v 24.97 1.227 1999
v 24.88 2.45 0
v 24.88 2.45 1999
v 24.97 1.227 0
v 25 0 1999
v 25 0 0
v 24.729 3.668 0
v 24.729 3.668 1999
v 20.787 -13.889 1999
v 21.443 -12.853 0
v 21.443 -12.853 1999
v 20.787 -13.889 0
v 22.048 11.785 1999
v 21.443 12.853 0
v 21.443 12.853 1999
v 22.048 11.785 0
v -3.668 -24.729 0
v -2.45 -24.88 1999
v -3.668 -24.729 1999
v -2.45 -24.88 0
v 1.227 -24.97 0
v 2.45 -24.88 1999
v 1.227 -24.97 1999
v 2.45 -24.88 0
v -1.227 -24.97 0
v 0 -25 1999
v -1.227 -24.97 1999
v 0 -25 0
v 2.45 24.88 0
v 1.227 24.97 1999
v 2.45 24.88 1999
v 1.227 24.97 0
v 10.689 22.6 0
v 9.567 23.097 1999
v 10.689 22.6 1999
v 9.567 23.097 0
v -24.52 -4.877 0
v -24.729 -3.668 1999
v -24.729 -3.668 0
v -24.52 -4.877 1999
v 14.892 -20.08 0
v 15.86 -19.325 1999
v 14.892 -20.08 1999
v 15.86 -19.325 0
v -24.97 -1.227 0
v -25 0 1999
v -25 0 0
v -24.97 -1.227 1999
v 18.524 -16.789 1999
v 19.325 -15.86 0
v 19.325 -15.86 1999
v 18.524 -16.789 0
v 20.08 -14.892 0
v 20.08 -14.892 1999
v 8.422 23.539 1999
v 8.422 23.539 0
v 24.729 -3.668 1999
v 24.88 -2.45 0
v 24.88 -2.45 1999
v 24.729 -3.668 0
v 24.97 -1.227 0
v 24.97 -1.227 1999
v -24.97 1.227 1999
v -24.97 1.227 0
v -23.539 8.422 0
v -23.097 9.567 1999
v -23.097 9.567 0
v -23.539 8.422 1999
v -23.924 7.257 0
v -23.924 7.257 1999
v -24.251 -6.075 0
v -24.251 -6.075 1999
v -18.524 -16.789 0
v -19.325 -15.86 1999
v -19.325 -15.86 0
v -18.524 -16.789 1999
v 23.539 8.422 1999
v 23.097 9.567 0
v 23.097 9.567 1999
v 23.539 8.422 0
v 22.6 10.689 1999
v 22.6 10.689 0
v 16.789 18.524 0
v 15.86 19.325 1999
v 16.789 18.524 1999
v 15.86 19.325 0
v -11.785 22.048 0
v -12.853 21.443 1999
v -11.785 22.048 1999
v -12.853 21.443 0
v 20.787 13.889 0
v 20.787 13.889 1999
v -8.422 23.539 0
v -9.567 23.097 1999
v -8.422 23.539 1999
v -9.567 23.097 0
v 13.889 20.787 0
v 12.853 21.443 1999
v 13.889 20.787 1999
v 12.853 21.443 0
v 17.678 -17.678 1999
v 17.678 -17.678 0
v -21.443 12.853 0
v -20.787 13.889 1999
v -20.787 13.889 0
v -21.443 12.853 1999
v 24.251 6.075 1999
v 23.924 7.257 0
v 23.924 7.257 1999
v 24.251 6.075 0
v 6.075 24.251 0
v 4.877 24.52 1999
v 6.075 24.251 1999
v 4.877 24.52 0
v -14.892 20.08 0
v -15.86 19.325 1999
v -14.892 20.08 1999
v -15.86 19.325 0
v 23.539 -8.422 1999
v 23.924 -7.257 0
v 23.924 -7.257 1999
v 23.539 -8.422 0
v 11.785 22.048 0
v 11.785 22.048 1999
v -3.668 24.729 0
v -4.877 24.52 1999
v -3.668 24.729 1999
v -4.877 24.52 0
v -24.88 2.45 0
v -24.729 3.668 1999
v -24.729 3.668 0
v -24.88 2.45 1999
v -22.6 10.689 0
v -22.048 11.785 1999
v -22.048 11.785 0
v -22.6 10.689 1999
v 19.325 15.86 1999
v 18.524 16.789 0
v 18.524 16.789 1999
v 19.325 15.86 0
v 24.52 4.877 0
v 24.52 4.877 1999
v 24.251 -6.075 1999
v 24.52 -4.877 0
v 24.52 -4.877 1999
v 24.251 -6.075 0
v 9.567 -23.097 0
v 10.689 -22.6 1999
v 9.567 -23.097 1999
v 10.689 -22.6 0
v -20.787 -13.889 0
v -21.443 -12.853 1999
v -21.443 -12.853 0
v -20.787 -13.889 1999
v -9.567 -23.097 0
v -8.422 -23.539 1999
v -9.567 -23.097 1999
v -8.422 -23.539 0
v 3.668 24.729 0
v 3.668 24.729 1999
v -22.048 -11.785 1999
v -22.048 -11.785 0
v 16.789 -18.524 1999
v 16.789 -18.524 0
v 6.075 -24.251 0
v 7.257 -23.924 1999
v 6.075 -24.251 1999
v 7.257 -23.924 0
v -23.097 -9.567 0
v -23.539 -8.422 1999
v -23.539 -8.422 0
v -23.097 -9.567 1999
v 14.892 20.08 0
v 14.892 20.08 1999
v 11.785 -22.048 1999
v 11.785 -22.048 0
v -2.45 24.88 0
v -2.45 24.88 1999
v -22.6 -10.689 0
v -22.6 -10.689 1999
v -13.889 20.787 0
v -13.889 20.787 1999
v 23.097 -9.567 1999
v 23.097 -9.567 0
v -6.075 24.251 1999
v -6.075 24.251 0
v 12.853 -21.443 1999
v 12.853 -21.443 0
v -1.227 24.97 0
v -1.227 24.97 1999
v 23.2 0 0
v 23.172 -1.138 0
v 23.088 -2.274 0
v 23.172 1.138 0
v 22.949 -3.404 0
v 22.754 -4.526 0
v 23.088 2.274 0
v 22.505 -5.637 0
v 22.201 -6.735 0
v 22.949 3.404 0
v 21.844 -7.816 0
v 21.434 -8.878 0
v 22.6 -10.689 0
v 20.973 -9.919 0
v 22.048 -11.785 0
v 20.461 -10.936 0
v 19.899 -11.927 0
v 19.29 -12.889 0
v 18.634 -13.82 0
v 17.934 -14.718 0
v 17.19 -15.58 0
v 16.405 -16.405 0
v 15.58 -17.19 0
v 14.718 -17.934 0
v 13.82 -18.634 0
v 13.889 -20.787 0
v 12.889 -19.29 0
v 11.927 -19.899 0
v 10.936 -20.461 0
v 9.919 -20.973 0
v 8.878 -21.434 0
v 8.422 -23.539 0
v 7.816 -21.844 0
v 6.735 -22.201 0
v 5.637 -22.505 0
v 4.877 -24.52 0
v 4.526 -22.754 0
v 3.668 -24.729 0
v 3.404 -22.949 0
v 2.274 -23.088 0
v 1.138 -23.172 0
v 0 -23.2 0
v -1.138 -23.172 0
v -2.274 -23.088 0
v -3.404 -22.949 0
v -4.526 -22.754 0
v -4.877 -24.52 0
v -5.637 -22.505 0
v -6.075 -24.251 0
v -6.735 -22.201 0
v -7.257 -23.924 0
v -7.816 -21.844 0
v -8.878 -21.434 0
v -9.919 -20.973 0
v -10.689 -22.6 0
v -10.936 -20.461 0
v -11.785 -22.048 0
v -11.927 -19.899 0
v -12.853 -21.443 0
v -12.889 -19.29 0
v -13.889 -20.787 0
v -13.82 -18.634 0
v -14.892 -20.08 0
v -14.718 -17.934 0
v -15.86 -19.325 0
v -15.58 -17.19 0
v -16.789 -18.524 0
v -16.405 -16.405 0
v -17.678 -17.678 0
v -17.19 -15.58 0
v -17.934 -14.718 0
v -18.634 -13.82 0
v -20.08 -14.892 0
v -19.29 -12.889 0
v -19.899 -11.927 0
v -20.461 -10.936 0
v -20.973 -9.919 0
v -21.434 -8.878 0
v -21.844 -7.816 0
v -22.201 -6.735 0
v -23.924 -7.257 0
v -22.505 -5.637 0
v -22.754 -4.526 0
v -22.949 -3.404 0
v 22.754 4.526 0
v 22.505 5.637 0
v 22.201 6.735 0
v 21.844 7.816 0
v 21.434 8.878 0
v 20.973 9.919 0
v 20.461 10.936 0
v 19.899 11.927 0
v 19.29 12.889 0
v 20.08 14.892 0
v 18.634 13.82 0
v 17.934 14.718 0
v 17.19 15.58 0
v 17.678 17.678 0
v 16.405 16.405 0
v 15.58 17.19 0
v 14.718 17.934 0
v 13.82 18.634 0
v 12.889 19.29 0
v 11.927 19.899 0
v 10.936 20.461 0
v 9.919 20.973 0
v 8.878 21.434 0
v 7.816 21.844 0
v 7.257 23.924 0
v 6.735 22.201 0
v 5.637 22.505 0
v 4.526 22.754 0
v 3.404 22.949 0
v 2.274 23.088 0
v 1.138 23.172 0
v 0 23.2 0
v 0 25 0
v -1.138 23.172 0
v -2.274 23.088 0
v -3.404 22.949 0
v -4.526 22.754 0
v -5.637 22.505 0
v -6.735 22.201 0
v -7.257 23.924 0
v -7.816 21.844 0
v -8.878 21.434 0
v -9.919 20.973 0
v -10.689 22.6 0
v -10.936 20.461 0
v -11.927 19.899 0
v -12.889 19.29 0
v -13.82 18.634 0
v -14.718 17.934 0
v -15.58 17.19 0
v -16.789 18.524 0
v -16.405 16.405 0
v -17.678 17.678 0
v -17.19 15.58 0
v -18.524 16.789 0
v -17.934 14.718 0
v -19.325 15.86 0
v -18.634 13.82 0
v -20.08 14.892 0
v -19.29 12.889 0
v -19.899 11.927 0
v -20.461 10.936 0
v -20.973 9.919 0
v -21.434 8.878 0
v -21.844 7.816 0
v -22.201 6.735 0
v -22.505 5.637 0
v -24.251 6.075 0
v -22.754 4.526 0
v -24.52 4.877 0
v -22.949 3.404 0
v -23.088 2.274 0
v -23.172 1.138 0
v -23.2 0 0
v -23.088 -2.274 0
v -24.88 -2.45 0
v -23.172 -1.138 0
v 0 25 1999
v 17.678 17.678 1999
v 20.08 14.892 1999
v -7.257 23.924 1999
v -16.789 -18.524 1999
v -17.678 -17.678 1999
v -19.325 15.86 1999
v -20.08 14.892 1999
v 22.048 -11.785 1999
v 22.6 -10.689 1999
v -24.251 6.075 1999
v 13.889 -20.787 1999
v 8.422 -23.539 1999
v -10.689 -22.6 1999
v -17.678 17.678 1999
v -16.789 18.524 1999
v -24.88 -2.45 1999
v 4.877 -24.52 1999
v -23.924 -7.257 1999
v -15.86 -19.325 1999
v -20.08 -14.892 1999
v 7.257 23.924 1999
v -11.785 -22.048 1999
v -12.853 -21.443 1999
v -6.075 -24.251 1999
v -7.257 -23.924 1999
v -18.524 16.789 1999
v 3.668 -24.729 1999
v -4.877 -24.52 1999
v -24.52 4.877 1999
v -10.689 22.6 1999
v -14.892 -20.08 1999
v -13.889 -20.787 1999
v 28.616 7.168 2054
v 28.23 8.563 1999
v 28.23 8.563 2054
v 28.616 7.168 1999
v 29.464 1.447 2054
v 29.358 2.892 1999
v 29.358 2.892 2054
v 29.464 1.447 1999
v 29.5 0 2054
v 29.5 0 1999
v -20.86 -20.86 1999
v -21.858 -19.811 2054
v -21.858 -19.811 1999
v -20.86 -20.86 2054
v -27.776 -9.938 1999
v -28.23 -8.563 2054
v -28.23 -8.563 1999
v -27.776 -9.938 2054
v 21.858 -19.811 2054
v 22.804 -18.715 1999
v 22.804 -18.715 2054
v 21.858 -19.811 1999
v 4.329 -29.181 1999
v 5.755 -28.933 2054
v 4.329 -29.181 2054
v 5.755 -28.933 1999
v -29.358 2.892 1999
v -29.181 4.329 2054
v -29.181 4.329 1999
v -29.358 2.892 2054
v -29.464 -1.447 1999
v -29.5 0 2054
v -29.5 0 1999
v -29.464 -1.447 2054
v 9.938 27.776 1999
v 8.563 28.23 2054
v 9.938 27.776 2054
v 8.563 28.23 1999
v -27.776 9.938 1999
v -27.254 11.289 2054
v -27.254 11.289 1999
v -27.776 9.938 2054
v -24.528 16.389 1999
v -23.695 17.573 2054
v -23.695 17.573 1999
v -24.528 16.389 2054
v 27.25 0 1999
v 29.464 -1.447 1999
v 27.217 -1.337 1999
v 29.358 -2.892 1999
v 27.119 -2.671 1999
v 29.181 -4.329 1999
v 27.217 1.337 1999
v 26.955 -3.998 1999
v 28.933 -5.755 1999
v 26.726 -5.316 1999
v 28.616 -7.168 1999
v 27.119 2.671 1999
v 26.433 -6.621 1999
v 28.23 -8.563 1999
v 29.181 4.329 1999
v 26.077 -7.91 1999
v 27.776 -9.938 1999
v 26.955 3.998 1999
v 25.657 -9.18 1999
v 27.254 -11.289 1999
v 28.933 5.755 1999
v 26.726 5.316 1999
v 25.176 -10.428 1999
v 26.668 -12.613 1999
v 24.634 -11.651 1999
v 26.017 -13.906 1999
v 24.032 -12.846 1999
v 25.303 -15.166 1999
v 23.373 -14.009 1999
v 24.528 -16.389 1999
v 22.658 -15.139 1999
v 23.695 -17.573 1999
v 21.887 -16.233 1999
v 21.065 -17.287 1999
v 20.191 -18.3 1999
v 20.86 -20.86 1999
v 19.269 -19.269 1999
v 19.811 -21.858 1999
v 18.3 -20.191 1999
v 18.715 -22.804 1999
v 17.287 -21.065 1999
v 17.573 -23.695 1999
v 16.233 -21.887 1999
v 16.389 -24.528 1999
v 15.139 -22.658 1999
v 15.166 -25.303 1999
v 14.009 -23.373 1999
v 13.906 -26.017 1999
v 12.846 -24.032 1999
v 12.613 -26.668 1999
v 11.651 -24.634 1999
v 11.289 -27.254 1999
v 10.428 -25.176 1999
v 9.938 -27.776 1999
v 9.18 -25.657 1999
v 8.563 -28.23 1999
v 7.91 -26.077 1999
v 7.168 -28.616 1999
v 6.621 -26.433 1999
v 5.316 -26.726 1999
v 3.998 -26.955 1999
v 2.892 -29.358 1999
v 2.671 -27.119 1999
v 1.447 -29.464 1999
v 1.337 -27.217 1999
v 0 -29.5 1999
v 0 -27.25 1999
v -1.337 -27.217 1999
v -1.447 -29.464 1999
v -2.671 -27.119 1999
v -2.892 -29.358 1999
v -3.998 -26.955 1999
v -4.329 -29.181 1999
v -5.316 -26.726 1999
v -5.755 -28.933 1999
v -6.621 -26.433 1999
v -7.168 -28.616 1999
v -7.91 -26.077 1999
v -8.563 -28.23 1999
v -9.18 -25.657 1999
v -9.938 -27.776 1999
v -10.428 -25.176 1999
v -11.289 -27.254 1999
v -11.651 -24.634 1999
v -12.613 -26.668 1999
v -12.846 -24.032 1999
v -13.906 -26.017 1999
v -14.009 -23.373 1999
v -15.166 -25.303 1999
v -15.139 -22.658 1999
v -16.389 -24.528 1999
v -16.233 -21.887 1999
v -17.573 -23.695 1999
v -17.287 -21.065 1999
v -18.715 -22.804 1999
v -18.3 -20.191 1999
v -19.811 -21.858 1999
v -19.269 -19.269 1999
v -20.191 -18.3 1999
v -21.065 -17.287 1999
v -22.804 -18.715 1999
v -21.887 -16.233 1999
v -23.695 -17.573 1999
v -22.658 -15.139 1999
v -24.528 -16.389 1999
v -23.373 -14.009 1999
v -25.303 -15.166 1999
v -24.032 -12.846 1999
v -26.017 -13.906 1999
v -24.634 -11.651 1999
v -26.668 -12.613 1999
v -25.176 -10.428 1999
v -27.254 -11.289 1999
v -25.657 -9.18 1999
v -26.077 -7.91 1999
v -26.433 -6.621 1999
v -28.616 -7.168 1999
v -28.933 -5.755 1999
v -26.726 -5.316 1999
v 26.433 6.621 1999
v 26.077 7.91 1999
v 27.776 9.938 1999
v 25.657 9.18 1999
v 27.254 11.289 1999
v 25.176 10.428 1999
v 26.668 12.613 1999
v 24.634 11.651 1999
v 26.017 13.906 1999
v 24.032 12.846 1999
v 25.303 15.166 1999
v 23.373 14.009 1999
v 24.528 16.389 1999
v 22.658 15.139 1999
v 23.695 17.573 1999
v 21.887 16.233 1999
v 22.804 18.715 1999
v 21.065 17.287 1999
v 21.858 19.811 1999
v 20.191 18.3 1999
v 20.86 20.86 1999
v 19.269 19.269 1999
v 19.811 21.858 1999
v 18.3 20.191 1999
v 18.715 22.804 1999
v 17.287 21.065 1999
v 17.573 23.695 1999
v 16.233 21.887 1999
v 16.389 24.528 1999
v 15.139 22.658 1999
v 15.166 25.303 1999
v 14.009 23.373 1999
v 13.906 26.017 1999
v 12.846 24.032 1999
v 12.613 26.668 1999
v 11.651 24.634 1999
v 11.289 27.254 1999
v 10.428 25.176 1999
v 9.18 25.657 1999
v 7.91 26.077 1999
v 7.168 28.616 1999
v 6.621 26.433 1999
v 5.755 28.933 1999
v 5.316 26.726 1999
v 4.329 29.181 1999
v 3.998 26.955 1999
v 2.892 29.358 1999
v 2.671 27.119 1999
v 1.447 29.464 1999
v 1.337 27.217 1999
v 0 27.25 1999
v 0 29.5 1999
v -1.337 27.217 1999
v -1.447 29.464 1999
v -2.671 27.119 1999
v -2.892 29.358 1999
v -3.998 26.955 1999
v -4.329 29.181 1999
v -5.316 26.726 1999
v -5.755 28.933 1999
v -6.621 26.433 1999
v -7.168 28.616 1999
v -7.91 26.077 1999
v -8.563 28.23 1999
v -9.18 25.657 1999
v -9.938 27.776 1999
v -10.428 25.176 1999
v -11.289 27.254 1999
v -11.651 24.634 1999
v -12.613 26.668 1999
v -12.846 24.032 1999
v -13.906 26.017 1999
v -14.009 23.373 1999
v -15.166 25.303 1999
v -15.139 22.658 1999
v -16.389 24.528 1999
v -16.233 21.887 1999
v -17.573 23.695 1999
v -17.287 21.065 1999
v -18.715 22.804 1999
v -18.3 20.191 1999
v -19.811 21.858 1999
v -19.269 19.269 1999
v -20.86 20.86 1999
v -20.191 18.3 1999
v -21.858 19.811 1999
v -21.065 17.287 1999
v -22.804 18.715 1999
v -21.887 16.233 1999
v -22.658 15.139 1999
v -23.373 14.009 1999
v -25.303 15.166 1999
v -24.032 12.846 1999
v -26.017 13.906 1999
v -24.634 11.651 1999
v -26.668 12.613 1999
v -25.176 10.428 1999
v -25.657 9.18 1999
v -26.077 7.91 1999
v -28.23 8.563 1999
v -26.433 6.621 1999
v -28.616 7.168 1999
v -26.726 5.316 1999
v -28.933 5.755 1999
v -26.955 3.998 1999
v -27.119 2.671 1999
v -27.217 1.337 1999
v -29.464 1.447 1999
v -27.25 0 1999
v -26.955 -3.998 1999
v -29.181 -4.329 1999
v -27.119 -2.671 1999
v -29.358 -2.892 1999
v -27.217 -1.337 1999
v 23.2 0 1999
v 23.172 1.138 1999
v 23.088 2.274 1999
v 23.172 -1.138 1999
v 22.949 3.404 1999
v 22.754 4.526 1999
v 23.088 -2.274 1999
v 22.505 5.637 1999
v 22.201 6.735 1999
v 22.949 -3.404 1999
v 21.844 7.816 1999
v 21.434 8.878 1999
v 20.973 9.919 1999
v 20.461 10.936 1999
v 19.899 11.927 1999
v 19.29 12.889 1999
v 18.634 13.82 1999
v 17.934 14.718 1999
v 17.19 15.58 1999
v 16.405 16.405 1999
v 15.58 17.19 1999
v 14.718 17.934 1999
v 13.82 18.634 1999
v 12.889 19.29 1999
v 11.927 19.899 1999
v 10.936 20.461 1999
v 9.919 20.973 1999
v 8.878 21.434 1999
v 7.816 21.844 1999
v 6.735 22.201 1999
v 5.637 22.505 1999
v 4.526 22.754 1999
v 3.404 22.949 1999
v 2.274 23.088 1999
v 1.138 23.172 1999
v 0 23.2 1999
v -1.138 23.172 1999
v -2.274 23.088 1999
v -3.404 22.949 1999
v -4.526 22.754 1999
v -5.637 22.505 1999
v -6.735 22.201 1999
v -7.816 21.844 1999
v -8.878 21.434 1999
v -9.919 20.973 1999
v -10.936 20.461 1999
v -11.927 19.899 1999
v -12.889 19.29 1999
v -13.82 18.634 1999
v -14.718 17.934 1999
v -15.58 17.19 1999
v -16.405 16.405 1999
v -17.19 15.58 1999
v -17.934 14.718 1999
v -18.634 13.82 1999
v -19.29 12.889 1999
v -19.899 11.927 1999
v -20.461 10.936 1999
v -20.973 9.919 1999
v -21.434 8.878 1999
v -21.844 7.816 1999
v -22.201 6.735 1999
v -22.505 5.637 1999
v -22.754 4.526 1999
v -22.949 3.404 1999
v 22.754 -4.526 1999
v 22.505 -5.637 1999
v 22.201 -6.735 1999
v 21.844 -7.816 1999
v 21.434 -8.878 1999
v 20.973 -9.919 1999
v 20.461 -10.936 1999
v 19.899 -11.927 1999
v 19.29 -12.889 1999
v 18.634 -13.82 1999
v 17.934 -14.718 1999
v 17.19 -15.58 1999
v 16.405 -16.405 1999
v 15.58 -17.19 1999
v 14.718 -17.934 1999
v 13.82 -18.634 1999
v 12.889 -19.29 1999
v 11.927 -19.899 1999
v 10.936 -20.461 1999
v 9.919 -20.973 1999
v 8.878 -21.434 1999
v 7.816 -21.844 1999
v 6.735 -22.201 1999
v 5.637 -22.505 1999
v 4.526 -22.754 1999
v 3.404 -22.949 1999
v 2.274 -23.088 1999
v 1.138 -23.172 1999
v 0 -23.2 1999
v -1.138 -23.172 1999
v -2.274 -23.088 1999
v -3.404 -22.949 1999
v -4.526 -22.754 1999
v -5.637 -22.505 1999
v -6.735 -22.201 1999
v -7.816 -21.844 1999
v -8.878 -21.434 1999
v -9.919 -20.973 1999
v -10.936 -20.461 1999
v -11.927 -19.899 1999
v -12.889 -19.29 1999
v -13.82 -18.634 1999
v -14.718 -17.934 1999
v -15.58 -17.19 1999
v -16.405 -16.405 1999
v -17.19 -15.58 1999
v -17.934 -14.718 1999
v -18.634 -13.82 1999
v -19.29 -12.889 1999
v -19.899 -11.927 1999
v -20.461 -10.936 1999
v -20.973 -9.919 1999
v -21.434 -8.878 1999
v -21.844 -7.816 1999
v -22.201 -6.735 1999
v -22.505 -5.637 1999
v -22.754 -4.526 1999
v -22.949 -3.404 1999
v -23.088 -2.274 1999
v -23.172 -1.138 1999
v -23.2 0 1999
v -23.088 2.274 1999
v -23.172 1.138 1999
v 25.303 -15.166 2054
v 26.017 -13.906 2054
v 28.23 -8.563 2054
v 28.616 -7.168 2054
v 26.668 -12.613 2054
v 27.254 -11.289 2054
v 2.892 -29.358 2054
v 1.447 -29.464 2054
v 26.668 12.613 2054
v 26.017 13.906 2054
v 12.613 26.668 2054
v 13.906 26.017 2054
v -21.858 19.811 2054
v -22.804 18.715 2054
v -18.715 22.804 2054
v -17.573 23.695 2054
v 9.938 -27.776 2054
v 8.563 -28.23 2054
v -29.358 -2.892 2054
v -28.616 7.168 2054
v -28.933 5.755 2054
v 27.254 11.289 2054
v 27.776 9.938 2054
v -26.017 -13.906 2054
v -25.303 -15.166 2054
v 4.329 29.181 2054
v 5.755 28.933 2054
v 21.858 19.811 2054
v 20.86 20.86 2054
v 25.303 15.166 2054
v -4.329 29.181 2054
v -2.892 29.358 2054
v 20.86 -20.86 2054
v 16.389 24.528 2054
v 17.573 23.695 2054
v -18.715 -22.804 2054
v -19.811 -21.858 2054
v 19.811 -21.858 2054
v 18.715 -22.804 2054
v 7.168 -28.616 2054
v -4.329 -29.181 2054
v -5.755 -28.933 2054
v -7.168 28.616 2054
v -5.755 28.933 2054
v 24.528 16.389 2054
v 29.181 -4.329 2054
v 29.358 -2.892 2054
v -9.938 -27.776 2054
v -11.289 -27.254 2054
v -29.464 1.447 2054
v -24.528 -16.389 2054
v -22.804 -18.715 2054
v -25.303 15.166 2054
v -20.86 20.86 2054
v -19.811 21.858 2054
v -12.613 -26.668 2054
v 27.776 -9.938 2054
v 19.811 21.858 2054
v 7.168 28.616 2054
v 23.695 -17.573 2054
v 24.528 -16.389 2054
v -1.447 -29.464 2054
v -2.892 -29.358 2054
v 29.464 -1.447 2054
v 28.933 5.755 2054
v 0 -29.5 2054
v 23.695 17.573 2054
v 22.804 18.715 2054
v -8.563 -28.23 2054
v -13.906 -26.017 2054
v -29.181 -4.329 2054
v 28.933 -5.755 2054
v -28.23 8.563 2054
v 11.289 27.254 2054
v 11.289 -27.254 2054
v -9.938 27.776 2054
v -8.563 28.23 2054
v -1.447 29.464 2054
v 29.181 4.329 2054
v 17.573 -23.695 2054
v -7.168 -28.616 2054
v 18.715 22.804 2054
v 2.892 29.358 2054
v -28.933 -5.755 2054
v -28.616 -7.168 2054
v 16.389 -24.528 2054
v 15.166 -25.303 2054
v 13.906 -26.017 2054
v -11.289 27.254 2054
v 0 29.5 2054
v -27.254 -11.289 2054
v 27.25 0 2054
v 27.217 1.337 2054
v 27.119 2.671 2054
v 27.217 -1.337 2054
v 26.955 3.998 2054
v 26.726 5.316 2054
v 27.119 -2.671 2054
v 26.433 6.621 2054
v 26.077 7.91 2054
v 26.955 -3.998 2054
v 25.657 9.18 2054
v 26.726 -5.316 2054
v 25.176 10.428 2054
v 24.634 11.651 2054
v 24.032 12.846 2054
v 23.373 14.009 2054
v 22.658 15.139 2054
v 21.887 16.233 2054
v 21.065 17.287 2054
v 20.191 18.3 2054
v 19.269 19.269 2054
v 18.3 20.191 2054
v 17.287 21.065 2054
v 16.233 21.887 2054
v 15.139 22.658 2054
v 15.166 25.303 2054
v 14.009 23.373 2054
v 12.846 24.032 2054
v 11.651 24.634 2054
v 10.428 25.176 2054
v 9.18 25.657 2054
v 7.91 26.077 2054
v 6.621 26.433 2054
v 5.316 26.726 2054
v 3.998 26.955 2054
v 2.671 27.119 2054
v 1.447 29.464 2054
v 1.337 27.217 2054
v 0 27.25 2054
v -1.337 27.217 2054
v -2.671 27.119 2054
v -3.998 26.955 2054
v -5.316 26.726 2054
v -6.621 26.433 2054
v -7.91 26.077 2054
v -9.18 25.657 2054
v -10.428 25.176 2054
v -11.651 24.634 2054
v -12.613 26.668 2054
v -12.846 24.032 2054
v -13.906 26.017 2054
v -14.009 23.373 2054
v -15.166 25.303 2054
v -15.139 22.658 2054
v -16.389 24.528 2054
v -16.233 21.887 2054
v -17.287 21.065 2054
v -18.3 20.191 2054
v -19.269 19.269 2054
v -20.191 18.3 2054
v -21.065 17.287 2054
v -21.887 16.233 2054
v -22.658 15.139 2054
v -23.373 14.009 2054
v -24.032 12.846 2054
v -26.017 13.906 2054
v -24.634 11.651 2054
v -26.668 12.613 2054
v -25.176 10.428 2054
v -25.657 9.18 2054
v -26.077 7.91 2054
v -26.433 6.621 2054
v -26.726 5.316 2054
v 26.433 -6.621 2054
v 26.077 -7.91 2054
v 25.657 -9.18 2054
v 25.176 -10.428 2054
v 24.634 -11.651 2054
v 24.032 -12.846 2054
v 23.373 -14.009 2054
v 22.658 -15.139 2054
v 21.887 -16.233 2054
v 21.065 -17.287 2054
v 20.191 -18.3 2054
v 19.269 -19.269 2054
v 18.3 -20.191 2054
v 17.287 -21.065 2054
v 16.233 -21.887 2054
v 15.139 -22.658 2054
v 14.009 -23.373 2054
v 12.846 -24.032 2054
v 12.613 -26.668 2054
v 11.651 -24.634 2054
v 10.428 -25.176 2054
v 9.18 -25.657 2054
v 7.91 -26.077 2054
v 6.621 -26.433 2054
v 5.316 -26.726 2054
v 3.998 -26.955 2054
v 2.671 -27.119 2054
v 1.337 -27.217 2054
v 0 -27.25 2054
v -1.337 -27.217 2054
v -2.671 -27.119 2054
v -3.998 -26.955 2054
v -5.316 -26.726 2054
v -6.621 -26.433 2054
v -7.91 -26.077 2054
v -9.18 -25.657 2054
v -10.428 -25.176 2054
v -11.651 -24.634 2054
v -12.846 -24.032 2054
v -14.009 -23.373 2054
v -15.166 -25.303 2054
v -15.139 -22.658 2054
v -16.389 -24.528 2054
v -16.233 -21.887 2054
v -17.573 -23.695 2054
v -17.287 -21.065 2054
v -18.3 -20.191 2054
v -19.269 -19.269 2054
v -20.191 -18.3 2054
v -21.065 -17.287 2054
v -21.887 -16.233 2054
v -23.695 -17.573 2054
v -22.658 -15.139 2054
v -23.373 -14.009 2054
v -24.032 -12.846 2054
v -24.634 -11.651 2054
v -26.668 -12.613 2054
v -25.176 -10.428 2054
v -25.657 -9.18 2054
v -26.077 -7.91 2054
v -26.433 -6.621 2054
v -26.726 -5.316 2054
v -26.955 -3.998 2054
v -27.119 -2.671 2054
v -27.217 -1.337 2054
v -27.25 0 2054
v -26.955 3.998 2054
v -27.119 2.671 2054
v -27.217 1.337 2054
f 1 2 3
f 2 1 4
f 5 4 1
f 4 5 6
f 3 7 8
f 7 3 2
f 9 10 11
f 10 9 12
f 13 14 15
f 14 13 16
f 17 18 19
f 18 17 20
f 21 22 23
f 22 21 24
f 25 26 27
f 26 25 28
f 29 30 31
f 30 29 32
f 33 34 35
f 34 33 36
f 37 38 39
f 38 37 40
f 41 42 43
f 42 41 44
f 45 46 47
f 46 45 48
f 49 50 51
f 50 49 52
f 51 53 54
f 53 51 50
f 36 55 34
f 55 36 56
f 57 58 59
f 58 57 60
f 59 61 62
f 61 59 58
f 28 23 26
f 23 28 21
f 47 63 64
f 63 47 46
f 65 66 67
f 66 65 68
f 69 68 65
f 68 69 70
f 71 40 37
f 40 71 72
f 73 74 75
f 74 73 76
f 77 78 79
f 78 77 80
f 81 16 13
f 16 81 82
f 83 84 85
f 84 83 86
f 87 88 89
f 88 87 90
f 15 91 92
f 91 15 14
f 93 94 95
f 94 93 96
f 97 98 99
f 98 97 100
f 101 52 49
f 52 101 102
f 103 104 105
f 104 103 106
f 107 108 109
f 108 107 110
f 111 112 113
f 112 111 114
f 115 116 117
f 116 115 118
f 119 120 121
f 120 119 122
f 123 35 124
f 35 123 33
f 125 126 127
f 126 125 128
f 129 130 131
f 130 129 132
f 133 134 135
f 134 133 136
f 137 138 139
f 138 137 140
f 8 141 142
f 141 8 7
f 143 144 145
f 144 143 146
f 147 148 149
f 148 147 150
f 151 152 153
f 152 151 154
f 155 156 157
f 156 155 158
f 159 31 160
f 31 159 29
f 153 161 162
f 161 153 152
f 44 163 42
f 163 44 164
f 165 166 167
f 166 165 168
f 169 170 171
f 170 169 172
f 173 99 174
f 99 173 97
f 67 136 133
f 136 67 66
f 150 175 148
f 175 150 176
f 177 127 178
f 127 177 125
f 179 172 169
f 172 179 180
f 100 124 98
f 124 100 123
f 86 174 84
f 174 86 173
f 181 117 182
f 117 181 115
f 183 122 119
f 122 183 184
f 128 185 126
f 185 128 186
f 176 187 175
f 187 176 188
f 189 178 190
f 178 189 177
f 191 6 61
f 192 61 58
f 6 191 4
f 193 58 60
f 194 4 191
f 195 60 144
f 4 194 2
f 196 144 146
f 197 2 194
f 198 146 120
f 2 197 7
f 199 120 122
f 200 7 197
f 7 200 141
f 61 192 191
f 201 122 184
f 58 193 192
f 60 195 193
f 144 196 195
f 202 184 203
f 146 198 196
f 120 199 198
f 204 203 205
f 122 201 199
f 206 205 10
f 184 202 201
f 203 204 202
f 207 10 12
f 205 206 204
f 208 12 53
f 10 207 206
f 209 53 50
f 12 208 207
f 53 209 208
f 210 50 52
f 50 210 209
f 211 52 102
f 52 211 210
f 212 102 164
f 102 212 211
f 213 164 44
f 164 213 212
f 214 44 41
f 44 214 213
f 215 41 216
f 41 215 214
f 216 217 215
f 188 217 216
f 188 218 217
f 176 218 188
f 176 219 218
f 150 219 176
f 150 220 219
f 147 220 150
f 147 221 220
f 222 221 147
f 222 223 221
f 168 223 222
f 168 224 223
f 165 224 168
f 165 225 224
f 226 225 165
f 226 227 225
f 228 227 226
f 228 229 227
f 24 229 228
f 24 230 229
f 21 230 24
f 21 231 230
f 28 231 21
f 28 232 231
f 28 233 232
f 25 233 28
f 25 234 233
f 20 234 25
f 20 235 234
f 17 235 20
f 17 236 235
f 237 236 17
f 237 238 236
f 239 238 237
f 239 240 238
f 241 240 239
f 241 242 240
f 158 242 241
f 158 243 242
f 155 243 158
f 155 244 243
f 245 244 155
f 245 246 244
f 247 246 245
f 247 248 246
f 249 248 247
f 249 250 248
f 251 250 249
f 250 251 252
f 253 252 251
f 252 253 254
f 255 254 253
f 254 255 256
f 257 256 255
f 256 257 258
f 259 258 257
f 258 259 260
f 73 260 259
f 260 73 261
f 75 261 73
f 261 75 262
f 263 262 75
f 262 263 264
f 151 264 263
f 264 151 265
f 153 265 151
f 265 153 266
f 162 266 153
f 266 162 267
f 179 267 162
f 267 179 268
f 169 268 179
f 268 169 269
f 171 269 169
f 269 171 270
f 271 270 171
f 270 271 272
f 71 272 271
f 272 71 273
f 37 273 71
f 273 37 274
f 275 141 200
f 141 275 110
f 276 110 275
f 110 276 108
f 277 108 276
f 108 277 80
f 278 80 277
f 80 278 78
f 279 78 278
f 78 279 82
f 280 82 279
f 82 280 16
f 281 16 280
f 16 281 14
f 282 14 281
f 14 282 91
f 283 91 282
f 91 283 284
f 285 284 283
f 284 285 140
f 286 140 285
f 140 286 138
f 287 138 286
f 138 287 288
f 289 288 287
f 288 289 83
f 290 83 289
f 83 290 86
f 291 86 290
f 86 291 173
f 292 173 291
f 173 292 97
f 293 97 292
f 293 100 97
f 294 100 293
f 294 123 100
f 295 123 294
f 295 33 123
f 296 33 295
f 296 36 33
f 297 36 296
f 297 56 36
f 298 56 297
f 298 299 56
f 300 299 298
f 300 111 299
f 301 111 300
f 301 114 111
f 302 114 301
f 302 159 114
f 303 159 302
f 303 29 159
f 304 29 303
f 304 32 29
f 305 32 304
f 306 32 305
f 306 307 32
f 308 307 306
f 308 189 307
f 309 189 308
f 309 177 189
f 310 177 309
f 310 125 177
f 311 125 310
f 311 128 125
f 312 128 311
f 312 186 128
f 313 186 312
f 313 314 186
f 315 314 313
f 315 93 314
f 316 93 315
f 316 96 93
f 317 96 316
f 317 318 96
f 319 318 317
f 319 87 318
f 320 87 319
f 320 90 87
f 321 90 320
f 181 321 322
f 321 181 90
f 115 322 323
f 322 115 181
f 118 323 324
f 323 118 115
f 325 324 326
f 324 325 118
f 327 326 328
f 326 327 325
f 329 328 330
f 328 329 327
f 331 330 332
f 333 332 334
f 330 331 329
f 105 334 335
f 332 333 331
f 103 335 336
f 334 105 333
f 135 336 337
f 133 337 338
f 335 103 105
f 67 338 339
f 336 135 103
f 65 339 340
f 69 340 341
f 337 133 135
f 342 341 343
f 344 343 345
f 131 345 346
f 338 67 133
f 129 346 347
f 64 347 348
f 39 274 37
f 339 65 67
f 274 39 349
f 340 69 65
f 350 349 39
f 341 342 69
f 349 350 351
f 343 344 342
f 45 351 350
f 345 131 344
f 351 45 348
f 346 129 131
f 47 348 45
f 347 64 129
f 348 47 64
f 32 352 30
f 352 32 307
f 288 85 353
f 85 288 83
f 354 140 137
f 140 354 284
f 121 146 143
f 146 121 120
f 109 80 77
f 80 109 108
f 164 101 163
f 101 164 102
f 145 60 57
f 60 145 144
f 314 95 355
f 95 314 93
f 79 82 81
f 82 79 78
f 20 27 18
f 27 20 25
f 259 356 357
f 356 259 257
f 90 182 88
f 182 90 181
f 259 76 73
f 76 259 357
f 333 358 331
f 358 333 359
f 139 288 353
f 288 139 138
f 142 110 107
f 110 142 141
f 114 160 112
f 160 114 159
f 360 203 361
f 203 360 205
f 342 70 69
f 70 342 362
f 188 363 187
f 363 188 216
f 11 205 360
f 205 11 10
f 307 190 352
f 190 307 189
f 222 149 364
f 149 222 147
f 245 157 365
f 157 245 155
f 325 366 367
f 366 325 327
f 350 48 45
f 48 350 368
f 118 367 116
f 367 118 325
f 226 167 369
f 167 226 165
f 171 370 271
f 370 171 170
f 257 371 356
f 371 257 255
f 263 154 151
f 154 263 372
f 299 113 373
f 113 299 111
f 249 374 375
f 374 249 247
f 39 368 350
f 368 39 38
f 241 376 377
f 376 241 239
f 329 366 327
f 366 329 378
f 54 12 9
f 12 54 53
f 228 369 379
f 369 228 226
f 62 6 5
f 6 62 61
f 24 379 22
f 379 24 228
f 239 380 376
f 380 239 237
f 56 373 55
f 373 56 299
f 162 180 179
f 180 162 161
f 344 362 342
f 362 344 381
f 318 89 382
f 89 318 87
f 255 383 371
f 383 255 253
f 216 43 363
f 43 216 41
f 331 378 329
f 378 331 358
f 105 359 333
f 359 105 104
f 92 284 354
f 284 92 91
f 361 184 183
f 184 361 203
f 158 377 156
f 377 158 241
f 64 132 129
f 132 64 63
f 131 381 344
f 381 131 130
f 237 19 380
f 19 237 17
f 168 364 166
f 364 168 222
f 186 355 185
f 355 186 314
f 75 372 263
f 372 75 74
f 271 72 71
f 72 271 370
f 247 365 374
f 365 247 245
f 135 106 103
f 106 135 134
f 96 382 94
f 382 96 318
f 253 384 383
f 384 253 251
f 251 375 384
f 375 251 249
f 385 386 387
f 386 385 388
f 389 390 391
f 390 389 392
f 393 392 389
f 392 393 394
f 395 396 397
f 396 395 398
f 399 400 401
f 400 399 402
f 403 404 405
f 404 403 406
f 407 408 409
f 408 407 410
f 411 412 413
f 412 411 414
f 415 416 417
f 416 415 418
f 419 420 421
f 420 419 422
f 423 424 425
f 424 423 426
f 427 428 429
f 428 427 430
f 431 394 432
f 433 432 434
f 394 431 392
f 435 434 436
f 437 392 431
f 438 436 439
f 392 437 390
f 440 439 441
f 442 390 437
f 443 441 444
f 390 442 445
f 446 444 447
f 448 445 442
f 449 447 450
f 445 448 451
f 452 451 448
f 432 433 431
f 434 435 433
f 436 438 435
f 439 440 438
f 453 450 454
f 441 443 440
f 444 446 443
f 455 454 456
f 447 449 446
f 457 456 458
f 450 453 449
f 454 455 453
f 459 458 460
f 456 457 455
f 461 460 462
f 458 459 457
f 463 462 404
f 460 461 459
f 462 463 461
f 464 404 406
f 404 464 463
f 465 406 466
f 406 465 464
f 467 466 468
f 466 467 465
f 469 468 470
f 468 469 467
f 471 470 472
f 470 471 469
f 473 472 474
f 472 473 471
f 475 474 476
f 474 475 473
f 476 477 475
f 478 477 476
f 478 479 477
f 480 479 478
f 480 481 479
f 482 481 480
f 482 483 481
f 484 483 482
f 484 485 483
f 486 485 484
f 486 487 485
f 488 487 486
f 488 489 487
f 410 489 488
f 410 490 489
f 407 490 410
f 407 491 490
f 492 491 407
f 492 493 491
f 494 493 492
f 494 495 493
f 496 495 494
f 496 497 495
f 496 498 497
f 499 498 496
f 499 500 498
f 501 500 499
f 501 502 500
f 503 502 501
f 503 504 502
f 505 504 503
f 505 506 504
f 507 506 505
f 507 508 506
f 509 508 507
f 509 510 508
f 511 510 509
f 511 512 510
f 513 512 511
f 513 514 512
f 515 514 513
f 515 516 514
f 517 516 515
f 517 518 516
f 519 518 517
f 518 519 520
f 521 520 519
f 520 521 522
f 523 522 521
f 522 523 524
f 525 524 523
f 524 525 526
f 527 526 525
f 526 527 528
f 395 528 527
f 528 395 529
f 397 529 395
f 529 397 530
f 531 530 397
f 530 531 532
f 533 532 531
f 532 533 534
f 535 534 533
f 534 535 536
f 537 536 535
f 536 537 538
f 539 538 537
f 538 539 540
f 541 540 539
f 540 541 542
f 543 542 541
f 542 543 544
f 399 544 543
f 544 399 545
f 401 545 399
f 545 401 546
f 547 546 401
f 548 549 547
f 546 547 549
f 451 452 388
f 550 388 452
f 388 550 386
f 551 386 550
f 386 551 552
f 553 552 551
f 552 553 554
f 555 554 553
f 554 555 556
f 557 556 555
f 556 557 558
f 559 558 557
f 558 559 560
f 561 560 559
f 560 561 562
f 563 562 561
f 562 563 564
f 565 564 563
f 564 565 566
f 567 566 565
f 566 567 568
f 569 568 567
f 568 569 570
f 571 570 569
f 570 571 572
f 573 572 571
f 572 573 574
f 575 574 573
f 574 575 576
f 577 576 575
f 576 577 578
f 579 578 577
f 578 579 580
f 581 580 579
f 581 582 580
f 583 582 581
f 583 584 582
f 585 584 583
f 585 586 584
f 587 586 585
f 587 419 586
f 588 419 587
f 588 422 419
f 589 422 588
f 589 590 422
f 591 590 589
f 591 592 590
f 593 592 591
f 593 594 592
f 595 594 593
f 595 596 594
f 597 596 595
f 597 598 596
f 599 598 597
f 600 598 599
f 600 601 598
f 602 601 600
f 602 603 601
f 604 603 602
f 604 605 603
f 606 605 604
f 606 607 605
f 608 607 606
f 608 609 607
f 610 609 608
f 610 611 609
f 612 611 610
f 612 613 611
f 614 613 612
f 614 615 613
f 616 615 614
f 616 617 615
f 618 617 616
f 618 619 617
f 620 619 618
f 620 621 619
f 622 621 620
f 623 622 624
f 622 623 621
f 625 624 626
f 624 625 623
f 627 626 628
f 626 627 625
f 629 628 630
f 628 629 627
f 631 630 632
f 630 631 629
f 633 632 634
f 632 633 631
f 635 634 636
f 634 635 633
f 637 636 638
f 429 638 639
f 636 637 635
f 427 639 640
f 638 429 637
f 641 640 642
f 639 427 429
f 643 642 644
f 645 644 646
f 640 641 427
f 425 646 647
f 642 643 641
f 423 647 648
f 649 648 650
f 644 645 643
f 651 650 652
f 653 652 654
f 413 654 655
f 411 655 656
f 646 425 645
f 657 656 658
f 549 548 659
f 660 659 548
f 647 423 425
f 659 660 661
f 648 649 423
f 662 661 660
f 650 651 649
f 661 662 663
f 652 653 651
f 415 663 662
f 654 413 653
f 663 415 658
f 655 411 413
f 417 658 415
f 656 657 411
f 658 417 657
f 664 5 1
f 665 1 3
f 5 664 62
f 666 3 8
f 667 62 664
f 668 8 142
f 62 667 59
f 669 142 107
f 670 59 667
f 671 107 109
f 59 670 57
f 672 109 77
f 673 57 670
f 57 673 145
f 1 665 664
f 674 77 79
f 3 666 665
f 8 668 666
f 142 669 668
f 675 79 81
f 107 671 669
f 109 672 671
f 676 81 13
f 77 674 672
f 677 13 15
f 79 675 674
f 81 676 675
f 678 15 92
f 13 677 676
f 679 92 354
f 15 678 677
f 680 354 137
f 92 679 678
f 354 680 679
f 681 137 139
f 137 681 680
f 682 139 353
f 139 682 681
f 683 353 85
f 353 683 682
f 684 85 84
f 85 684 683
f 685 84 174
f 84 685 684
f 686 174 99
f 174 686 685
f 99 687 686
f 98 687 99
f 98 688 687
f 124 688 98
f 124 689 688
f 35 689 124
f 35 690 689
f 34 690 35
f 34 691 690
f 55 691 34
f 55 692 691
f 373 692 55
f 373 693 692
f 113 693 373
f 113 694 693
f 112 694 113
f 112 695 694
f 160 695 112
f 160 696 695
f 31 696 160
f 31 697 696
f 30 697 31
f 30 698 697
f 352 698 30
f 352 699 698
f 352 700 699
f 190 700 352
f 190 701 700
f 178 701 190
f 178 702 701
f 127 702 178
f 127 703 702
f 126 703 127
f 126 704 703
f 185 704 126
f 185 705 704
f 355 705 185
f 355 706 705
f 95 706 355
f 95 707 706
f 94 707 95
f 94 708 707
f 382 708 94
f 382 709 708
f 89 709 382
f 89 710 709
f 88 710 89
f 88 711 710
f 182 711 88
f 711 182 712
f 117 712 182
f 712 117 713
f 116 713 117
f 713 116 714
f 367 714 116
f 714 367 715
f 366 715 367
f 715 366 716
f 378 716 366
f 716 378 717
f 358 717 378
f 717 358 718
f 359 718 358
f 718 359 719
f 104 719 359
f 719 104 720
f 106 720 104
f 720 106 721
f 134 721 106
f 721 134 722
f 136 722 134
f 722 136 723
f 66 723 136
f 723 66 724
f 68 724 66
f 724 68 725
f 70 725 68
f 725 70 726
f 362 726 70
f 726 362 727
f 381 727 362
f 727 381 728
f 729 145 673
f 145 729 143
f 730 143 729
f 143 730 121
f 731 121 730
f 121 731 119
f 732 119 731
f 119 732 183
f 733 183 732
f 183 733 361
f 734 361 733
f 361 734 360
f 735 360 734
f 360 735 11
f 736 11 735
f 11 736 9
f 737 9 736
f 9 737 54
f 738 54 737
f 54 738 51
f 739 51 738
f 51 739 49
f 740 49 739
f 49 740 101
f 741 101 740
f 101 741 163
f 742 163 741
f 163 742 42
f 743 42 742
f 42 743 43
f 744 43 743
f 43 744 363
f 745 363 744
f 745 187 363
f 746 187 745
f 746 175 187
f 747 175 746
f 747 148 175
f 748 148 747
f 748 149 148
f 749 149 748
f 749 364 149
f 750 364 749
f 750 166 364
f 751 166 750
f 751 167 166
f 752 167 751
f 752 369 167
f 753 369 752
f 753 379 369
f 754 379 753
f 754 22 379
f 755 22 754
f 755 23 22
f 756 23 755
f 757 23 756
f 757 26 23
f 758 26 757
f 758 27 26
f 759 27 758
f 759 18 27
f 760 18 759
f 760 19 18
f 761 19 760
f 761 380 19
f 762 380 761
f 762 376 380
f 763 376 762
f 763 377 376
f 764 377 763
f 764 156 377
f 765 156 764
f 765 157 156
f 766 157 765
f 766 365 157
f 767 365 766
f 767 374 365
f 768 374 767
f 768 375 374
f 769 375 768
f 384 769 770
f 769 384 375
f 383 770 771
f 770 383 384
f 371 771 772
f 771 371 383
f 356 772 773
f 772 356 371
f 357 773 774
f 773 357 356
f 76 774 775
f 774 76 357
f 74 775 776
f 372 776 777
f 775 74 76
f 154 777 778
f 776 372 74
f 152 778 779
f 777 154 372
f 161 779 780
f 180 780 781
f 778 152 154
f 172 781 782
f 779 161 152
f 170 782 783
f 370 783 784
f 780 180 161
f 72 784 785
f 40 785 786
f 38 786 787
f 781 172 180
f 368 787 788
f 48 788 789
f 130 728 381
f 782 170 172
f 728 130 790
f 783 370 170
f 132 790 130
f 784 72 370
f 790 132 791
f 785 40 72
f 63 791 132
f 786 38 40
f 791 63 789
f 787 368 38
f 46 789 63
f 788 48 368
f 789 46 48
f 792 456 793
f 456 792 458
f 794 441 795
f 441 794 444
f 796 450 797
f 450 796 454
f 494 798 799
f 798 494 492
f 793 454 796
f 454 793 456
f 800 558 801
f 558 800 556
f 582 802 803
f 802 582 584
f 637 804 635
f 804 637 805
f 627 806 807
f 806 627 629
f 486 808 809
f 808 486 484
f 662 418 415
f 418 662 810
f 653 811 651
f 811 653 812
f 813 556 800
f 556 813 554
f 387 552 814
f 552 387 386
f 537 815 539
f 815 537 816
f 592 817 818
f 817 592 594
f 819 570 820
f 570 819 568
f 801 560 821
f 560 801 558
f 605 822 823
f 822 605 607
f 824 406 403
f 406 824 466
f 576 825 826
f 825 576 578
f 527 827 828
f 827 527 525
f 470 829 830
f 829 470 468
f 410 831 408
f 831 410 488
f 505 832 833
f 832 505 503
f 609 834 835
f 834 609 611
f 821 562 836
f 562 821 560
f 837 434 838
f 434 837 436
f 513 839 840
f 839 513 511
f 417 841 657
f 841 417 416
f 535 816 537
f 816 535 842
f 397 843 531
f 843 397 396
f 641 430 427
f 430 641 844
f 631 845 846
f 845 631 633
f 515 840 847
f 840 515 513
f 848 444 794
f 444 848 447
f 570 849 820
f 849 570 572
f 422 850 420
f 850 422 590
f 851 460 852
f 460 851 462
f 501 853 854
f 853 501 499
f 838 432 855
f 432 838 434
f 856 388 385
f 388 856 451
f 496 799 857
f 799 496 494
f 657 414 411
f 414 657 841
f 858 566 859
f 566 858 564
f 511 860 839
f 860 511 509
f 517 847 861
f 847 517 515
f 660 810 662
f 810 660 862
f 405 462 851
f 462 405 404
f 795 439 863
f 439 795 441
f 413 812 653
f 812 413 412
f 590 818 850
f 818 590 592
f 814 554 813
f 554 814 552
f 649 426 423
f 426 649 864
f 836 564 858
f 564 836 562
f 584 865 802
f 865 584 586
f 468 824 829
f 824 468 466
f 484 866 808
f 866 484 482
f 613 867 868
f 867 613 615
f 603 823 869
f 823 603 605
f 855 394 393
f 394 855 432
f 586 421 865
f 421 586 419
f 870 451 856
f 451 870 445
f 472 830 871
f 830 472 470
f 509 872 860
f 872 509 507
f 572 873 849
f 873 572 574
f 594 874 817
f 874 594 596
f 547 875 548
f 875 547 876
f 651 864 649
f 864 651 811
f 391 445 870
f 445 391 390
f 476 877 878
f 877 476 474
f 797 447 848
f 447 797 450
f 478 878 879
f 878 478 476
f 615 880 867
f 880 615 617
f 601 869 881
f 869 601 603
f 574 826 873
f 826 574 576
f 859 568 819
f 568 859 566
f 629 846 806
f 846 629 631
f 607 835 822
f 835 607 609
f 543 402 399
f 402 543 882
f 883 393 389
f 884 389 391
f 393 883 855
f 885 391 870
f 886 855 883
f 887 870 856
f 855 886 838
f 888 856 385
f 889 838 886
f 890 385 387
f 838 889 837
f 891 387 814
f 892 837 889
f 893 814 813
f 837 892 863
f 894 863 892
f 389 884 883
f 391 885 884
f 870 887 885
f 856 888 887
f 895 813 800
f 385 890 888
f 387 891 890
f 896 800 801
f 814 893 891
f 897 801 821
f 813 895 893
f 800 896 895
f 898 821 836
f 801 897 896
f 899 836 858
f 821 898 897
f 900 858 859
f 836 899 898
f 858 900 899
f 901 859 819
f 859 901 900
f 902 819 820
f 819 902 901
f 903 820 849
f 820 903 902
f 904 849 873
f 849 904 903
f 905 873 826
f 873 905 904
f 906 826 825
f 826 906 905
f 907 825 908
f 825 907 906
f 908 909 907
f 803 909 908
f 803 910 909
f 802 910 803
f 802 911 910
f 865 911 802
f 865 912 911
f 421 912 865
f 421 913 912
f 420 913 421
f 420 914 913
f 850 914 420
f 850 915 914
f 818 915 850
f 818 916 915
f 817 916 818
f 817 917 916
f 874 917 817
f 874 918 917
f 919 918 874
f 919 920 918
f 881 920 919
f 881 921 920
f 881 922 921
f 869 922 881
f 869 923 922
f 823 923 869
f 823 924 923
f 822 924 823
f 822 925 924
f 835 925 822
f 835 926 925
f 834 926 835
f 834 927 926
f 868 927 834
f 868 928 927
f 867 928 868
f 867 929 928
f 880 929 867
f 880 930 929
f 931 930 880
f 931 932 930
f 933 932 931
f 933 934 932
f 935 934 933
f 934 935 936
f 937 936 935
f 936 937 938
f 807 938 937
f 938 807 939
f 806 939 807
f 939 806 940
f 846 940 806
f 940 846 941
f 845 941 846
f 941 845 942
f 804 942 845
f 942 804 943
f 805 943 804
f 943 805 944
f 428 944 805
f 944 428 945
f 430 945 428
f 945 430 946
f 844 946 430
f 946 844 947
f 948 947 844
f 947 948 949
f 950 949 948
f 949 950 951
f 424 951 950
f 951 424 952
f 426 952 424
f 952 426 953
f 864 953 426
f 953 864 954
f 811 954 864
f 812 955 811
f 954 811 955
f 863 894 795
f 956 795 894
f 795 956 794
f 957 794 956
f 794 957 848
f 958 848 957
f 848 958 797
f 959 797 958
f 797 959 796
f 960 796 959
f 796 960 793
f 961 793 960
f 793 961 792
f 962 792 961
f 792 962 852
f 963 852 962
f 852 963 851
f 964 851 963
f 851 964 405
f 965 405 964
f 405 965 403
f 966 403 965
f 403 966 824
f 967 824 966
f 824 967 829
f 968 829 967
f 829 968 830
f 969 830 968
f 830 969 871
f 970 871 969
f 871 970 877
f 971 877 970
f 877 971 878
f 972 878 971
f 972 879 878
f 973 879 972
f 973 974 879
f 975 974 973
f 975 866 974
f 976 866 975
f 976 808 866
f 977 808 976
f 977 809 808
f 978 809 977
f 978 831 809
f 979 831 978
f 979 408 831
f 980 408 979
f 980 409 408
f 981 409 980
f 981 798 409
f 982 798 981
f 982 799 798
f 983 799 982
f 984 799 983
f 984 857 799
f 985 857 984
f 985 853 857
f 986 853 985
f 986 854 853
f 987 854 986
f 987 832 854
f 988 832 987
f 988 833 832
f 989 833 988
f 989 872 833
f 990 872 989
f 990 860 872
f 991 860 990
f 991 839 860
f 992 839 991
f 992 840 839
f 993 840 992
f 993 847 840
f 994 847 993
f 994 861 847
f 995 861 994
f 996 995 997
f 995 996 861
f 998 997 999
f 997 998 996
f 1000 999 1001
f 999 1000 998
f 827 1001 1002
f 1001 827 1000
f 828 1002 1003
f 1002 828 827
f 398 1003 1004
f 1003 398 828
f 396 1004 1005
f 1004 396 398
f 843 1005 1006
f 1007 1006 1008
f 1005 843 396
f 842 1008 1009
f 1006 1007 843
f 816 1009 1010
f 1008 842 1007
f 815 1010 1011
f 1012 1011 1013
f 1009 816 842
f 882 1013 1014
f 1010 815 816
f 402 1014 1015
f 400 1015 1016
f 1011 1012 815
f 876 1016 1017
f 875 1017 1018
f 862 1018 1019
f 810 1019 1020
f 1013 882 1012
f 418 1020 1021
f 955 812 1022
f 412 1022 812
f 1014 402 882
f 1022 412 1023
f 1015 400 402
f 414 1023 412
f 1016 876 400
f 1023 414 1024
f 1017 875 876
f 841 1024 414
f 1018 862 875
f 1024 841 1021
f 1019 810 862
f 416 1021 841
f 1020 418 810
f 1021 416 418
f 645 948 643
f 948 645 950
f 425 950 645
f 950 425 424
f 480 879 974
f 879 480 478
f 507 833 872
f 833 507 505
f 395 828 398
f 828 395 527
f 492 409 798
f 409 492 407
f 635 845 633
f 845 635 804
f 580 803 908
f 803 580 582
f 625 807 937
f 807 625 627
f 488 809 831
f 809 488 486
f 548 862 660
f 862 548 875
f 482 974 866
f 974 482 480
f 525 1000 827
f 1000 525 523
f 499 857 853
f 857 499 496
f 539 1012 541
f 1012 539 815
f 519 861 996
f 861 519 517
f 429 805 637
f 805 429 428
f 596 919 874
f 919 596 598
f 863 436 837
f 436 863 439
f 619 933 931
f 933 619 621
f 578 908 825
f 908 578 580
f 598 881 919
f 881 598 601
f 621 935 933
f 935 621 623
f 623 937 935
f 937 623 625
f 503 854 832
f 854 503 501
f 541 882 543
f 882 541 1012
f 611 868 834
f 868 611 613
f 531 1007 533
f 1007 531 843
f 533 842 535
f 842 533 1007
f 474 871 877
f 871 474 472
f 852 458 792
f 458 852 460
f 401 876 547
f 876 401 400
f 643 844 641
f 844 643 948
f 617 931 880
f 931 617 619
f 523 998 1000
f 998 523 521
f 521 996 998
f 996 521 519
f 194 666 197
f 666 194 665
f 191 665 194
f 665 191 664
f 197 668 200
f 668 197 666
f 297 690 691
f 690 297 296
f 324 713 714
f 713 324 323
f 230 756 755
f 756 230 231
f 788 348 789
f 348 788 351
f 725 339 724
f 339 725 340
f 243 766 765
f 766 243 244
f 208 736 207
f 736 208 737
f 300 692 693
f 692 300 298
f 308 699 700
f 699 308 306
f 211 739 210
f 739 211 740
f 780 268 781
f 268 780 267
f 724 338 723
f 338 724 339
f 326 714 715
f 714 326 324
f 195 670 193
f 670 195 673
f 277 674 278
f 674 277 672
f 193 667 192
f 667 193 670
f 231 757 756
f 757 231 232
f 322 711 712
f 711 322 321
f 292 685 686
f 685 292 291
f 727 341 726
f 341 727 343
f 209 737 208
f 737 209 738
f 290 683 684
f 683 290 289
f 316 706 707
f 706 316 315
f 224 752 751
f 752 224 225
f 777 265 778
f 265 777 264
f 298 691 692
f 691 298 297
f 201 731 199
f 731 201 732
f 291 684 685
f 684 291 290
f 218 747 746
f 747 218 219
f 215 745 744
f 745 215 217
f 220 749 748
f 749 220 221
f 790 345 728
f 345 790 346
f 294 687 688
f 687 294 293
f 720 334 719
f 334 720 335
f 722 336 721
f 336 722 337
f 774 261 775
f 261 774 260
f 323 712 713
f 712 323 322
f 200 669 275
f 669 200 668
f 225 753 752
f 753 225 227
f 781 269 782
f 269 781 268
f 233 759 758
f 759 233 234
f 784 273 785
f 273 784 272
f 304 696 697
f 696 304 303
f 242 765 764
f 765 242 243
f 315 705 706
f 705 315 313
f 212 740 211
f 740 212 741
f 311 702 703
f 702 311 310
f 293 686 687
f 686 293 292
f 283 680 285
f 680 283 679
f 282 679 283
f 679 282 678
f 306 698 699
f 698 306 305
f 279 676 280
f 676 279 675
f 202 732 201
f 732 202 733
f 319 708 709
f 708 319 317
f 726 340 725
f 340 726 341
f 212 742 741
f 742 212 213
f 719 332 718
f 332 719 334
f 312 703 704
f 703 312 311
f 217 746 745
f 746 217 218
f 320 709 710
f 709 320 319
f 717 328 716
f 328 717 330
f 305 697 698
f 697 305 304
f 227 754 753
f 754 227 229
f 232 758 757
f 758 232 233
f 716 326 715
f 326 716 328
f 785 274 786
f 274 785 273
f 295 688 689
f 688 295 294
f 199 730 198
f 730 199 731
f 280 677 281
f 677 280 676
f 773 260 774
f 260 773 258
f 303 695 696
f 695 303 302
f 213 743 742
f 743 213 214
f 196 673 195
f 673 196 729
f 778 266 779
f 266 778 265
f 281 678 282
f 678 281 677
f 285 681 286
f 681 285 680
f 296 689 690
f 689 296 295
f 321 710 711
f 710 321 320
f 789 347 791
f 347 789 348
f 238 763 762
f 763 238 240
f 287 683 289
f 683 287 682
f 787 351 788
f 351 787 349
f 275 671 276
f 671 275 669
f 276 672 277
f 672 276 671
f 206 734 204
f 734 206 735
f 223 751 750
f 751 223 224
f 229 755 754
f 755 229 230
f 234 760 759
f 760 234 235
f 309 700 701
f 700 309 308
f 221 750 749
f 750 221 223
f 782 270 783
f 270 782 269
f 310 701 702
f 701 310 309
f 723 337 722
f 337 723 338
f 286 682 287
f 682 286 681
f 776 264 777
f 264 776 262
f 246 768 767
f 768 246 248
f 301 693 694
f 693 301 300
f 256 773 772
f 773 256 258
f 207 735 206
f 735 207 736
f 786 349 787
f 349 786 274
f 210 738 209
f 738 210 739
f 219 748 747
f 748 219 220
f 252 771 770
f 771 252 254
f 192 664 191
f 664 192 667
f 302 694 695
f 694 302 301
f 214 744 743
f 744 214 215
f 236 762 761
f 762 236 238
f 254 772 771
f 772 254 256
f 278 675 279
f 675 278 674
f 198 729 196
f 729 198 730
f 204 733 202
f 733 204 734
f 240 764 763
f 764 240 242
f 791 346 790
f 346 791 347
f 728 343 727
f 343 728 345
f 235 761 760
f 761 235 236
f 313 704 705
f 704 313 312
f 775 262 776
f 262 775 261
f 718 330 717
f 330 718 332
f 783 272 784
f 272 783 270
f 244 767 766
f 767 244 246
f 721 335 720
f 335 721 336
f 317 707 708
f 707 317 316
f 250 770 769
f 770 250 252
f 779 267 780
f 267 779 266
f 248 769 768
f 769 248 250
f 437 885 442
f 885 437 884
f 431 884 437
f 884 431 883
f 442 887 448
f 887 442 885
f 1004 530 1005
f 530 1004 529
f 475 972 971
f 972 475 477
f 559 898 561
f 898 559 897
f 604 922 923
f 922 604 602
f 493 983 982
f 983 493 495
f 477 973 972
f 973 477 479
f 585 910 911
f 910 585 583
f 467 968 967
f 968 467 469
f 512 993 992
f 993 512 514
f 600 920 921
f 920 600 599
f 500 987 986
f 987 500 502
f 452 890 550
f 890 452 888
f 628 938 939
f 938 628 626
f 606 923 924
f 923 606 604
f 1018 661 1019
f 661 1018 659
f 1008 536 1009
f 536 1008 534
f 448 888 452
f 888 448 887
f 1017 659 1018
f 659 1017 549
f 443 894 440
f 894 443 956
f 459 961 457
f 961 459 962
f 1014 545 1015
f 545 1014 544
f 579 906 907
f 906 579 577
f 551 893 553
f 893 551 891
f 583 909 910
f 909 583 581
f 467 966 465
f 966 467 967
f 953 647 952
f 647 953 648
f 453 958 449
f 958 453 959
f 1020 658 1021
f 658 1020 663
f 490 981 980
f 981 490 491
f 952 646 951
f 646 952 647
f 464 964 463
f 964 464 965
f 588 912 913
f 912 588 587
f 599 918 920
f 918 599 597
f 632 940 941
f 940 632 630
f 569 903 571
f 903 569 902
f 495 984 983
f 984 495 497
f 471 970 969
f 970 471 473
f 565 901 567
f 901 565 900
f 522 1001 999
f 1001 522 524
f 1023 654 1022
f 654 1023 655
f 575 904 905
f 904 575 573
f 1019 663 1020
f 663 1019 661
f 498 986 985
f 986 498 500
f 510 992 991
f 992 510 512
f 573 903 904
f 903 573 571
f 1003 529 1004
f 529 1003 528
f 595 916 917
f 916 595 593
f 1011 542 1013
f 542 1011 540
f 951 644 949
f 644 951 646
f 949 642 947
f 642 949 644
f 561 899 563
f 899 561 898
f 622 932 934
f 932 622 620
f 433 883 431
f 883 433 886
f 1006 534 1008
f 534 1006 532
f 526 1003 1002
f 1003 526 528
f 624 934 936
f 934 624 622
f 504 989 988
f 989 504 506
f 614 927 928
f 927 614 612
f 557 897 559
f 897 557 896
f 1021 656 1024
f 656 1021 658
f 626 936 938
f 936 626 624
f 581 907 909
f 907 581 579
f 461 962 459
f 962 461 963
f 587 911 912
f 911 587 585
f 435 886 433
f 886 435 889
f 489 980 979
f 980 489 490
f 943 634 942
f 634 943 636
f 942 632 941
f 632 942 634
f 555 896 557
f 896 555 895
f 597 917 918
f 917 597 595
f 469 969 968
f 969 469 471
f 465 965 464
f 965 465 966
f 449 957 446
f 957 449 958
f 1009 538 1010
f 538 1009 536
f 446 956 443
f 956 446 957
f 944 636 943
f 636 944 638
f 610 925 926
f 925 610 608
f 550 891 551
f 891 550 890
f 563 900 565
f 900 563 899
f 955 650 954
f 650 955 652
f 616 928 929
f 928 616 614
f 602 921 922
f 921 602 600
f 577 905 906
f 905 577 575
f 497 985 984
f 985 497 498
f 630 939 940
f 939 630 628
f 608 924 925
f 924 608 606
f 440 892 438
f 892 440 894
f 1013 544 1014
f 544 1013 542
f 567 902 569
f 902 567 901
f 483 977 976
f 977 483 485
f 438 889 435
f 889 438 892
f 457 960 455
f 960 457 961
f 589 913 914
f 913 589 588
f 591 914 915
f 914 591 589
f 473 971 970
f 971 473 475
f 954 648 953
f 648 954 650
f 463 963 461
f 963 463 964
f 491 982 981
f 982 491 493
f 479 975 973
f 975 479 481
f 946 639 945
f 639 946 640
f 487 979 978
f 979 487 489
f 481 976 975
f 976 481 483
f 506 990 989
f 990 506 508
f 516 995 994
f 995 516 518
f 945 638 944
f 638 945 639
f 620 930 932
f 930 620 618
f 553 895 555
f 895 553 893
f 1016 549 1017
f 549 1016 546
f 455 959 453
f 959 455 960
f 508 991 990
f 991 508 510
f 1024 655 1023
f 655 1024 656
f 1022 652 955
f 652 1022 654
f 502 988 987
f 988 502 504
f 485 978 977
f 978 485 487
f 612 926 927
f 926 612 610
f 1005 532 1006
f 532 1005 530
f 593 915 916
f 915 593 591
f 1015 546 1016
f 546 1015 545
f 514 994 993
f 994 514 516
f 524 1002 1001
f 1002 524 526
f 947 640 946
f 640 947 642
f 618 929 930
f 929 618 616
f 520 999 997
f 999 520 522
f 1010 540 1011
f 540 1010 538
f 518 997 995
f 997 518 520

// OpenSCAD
// Parameters
nominal_size = 50; //[25:100:1]
length_mm = 2000; //[1000:4000:10]
pipe_od = 50; //[40:80:0.5]
pipe_wall = 1.8; //[1:4:0.1]
fitting_length = 55; //[30:110:1]
fitting_od_scale = 1.18; //[1.05:1.4:0.01]
fitting_wall_scale = 1.25; //[1:2:0.01]
socket_depth = 35; //[15:70:1]
socket_clearance = 0.4; //[0.1:1.2:0.05]
overlap = 1; //[0.5:2:0.1]

$fn = 128;

// HT Pipe - one connected solid (single difference with unioned outer shell)
module ht_pipe() {
  pipe_r = pipe_od/2;
  pipe_ir = max(0.01, pipe_r - pipe_wall);

  fit_od = pipe_od * fitting_od_scale;
  fit_r  = fit_od/2;

  fit_wall = pipe_wall * fitting_wall_scale;
  fit_ir = max(0.01, fit_r - fit_wall);

  // Socket inner radius (where another pipe inserts)
  socket_r = pipe_r + socket_clearance;

  // Ensure socket doesn't exceed fitting inner radius
  socket_r_eff = min(socket_r, fit_ir - 0.01);

  // Z positions (all derived)
  z_pipe0 = 0;
  z_pipe1 = length_mm;

  // Fitting overlaps into pipe by "overlap" to guarantee connectivity
  z_fit0 = z_pipe1 - overlap;
  z_fit1 = z_fit0 + fitting_length;

  // Socket void starts at the fitting mouth and goes inward by socket_depth
  z_socket0 = z_fit1 - socket_depth;
  z_socket1 = z_fit1;

  color([0.85, 0.85, 0.8])
  difference() {
    // OUTER SOLID (connected)
    union() {
      // Main pipe outer
      cylinder(h=length_mm, r=pipe_r, center=false);

      // Outer fitting sleeve (overlapping into pipe)
      translate([0, 0, z_fit0])
        cylinder(h=fitting_length, r=fit_r, center=false);
    }

    // INNER VOIDS (unioned)
    union() {
      // Main pipe bore (open ends)
      translate([0, 0, z_pipe0])
        cylinder(h=length_mm, r=pipe_ir, center=false);

      // Fitting bore (keeps wall thickness in sleeve region)
      translate([0, 0, z_fit0])
        cylinder(h=fitting_length, r=fit_ir, center=false);

      // Socket enlargement near mouth (creates socket step)
      translate([0, 0, z_socket0])
        cylinder(h=socket_depth, r=socket_r_eff, center=false);
    }
  }
}

ht_pipe();
